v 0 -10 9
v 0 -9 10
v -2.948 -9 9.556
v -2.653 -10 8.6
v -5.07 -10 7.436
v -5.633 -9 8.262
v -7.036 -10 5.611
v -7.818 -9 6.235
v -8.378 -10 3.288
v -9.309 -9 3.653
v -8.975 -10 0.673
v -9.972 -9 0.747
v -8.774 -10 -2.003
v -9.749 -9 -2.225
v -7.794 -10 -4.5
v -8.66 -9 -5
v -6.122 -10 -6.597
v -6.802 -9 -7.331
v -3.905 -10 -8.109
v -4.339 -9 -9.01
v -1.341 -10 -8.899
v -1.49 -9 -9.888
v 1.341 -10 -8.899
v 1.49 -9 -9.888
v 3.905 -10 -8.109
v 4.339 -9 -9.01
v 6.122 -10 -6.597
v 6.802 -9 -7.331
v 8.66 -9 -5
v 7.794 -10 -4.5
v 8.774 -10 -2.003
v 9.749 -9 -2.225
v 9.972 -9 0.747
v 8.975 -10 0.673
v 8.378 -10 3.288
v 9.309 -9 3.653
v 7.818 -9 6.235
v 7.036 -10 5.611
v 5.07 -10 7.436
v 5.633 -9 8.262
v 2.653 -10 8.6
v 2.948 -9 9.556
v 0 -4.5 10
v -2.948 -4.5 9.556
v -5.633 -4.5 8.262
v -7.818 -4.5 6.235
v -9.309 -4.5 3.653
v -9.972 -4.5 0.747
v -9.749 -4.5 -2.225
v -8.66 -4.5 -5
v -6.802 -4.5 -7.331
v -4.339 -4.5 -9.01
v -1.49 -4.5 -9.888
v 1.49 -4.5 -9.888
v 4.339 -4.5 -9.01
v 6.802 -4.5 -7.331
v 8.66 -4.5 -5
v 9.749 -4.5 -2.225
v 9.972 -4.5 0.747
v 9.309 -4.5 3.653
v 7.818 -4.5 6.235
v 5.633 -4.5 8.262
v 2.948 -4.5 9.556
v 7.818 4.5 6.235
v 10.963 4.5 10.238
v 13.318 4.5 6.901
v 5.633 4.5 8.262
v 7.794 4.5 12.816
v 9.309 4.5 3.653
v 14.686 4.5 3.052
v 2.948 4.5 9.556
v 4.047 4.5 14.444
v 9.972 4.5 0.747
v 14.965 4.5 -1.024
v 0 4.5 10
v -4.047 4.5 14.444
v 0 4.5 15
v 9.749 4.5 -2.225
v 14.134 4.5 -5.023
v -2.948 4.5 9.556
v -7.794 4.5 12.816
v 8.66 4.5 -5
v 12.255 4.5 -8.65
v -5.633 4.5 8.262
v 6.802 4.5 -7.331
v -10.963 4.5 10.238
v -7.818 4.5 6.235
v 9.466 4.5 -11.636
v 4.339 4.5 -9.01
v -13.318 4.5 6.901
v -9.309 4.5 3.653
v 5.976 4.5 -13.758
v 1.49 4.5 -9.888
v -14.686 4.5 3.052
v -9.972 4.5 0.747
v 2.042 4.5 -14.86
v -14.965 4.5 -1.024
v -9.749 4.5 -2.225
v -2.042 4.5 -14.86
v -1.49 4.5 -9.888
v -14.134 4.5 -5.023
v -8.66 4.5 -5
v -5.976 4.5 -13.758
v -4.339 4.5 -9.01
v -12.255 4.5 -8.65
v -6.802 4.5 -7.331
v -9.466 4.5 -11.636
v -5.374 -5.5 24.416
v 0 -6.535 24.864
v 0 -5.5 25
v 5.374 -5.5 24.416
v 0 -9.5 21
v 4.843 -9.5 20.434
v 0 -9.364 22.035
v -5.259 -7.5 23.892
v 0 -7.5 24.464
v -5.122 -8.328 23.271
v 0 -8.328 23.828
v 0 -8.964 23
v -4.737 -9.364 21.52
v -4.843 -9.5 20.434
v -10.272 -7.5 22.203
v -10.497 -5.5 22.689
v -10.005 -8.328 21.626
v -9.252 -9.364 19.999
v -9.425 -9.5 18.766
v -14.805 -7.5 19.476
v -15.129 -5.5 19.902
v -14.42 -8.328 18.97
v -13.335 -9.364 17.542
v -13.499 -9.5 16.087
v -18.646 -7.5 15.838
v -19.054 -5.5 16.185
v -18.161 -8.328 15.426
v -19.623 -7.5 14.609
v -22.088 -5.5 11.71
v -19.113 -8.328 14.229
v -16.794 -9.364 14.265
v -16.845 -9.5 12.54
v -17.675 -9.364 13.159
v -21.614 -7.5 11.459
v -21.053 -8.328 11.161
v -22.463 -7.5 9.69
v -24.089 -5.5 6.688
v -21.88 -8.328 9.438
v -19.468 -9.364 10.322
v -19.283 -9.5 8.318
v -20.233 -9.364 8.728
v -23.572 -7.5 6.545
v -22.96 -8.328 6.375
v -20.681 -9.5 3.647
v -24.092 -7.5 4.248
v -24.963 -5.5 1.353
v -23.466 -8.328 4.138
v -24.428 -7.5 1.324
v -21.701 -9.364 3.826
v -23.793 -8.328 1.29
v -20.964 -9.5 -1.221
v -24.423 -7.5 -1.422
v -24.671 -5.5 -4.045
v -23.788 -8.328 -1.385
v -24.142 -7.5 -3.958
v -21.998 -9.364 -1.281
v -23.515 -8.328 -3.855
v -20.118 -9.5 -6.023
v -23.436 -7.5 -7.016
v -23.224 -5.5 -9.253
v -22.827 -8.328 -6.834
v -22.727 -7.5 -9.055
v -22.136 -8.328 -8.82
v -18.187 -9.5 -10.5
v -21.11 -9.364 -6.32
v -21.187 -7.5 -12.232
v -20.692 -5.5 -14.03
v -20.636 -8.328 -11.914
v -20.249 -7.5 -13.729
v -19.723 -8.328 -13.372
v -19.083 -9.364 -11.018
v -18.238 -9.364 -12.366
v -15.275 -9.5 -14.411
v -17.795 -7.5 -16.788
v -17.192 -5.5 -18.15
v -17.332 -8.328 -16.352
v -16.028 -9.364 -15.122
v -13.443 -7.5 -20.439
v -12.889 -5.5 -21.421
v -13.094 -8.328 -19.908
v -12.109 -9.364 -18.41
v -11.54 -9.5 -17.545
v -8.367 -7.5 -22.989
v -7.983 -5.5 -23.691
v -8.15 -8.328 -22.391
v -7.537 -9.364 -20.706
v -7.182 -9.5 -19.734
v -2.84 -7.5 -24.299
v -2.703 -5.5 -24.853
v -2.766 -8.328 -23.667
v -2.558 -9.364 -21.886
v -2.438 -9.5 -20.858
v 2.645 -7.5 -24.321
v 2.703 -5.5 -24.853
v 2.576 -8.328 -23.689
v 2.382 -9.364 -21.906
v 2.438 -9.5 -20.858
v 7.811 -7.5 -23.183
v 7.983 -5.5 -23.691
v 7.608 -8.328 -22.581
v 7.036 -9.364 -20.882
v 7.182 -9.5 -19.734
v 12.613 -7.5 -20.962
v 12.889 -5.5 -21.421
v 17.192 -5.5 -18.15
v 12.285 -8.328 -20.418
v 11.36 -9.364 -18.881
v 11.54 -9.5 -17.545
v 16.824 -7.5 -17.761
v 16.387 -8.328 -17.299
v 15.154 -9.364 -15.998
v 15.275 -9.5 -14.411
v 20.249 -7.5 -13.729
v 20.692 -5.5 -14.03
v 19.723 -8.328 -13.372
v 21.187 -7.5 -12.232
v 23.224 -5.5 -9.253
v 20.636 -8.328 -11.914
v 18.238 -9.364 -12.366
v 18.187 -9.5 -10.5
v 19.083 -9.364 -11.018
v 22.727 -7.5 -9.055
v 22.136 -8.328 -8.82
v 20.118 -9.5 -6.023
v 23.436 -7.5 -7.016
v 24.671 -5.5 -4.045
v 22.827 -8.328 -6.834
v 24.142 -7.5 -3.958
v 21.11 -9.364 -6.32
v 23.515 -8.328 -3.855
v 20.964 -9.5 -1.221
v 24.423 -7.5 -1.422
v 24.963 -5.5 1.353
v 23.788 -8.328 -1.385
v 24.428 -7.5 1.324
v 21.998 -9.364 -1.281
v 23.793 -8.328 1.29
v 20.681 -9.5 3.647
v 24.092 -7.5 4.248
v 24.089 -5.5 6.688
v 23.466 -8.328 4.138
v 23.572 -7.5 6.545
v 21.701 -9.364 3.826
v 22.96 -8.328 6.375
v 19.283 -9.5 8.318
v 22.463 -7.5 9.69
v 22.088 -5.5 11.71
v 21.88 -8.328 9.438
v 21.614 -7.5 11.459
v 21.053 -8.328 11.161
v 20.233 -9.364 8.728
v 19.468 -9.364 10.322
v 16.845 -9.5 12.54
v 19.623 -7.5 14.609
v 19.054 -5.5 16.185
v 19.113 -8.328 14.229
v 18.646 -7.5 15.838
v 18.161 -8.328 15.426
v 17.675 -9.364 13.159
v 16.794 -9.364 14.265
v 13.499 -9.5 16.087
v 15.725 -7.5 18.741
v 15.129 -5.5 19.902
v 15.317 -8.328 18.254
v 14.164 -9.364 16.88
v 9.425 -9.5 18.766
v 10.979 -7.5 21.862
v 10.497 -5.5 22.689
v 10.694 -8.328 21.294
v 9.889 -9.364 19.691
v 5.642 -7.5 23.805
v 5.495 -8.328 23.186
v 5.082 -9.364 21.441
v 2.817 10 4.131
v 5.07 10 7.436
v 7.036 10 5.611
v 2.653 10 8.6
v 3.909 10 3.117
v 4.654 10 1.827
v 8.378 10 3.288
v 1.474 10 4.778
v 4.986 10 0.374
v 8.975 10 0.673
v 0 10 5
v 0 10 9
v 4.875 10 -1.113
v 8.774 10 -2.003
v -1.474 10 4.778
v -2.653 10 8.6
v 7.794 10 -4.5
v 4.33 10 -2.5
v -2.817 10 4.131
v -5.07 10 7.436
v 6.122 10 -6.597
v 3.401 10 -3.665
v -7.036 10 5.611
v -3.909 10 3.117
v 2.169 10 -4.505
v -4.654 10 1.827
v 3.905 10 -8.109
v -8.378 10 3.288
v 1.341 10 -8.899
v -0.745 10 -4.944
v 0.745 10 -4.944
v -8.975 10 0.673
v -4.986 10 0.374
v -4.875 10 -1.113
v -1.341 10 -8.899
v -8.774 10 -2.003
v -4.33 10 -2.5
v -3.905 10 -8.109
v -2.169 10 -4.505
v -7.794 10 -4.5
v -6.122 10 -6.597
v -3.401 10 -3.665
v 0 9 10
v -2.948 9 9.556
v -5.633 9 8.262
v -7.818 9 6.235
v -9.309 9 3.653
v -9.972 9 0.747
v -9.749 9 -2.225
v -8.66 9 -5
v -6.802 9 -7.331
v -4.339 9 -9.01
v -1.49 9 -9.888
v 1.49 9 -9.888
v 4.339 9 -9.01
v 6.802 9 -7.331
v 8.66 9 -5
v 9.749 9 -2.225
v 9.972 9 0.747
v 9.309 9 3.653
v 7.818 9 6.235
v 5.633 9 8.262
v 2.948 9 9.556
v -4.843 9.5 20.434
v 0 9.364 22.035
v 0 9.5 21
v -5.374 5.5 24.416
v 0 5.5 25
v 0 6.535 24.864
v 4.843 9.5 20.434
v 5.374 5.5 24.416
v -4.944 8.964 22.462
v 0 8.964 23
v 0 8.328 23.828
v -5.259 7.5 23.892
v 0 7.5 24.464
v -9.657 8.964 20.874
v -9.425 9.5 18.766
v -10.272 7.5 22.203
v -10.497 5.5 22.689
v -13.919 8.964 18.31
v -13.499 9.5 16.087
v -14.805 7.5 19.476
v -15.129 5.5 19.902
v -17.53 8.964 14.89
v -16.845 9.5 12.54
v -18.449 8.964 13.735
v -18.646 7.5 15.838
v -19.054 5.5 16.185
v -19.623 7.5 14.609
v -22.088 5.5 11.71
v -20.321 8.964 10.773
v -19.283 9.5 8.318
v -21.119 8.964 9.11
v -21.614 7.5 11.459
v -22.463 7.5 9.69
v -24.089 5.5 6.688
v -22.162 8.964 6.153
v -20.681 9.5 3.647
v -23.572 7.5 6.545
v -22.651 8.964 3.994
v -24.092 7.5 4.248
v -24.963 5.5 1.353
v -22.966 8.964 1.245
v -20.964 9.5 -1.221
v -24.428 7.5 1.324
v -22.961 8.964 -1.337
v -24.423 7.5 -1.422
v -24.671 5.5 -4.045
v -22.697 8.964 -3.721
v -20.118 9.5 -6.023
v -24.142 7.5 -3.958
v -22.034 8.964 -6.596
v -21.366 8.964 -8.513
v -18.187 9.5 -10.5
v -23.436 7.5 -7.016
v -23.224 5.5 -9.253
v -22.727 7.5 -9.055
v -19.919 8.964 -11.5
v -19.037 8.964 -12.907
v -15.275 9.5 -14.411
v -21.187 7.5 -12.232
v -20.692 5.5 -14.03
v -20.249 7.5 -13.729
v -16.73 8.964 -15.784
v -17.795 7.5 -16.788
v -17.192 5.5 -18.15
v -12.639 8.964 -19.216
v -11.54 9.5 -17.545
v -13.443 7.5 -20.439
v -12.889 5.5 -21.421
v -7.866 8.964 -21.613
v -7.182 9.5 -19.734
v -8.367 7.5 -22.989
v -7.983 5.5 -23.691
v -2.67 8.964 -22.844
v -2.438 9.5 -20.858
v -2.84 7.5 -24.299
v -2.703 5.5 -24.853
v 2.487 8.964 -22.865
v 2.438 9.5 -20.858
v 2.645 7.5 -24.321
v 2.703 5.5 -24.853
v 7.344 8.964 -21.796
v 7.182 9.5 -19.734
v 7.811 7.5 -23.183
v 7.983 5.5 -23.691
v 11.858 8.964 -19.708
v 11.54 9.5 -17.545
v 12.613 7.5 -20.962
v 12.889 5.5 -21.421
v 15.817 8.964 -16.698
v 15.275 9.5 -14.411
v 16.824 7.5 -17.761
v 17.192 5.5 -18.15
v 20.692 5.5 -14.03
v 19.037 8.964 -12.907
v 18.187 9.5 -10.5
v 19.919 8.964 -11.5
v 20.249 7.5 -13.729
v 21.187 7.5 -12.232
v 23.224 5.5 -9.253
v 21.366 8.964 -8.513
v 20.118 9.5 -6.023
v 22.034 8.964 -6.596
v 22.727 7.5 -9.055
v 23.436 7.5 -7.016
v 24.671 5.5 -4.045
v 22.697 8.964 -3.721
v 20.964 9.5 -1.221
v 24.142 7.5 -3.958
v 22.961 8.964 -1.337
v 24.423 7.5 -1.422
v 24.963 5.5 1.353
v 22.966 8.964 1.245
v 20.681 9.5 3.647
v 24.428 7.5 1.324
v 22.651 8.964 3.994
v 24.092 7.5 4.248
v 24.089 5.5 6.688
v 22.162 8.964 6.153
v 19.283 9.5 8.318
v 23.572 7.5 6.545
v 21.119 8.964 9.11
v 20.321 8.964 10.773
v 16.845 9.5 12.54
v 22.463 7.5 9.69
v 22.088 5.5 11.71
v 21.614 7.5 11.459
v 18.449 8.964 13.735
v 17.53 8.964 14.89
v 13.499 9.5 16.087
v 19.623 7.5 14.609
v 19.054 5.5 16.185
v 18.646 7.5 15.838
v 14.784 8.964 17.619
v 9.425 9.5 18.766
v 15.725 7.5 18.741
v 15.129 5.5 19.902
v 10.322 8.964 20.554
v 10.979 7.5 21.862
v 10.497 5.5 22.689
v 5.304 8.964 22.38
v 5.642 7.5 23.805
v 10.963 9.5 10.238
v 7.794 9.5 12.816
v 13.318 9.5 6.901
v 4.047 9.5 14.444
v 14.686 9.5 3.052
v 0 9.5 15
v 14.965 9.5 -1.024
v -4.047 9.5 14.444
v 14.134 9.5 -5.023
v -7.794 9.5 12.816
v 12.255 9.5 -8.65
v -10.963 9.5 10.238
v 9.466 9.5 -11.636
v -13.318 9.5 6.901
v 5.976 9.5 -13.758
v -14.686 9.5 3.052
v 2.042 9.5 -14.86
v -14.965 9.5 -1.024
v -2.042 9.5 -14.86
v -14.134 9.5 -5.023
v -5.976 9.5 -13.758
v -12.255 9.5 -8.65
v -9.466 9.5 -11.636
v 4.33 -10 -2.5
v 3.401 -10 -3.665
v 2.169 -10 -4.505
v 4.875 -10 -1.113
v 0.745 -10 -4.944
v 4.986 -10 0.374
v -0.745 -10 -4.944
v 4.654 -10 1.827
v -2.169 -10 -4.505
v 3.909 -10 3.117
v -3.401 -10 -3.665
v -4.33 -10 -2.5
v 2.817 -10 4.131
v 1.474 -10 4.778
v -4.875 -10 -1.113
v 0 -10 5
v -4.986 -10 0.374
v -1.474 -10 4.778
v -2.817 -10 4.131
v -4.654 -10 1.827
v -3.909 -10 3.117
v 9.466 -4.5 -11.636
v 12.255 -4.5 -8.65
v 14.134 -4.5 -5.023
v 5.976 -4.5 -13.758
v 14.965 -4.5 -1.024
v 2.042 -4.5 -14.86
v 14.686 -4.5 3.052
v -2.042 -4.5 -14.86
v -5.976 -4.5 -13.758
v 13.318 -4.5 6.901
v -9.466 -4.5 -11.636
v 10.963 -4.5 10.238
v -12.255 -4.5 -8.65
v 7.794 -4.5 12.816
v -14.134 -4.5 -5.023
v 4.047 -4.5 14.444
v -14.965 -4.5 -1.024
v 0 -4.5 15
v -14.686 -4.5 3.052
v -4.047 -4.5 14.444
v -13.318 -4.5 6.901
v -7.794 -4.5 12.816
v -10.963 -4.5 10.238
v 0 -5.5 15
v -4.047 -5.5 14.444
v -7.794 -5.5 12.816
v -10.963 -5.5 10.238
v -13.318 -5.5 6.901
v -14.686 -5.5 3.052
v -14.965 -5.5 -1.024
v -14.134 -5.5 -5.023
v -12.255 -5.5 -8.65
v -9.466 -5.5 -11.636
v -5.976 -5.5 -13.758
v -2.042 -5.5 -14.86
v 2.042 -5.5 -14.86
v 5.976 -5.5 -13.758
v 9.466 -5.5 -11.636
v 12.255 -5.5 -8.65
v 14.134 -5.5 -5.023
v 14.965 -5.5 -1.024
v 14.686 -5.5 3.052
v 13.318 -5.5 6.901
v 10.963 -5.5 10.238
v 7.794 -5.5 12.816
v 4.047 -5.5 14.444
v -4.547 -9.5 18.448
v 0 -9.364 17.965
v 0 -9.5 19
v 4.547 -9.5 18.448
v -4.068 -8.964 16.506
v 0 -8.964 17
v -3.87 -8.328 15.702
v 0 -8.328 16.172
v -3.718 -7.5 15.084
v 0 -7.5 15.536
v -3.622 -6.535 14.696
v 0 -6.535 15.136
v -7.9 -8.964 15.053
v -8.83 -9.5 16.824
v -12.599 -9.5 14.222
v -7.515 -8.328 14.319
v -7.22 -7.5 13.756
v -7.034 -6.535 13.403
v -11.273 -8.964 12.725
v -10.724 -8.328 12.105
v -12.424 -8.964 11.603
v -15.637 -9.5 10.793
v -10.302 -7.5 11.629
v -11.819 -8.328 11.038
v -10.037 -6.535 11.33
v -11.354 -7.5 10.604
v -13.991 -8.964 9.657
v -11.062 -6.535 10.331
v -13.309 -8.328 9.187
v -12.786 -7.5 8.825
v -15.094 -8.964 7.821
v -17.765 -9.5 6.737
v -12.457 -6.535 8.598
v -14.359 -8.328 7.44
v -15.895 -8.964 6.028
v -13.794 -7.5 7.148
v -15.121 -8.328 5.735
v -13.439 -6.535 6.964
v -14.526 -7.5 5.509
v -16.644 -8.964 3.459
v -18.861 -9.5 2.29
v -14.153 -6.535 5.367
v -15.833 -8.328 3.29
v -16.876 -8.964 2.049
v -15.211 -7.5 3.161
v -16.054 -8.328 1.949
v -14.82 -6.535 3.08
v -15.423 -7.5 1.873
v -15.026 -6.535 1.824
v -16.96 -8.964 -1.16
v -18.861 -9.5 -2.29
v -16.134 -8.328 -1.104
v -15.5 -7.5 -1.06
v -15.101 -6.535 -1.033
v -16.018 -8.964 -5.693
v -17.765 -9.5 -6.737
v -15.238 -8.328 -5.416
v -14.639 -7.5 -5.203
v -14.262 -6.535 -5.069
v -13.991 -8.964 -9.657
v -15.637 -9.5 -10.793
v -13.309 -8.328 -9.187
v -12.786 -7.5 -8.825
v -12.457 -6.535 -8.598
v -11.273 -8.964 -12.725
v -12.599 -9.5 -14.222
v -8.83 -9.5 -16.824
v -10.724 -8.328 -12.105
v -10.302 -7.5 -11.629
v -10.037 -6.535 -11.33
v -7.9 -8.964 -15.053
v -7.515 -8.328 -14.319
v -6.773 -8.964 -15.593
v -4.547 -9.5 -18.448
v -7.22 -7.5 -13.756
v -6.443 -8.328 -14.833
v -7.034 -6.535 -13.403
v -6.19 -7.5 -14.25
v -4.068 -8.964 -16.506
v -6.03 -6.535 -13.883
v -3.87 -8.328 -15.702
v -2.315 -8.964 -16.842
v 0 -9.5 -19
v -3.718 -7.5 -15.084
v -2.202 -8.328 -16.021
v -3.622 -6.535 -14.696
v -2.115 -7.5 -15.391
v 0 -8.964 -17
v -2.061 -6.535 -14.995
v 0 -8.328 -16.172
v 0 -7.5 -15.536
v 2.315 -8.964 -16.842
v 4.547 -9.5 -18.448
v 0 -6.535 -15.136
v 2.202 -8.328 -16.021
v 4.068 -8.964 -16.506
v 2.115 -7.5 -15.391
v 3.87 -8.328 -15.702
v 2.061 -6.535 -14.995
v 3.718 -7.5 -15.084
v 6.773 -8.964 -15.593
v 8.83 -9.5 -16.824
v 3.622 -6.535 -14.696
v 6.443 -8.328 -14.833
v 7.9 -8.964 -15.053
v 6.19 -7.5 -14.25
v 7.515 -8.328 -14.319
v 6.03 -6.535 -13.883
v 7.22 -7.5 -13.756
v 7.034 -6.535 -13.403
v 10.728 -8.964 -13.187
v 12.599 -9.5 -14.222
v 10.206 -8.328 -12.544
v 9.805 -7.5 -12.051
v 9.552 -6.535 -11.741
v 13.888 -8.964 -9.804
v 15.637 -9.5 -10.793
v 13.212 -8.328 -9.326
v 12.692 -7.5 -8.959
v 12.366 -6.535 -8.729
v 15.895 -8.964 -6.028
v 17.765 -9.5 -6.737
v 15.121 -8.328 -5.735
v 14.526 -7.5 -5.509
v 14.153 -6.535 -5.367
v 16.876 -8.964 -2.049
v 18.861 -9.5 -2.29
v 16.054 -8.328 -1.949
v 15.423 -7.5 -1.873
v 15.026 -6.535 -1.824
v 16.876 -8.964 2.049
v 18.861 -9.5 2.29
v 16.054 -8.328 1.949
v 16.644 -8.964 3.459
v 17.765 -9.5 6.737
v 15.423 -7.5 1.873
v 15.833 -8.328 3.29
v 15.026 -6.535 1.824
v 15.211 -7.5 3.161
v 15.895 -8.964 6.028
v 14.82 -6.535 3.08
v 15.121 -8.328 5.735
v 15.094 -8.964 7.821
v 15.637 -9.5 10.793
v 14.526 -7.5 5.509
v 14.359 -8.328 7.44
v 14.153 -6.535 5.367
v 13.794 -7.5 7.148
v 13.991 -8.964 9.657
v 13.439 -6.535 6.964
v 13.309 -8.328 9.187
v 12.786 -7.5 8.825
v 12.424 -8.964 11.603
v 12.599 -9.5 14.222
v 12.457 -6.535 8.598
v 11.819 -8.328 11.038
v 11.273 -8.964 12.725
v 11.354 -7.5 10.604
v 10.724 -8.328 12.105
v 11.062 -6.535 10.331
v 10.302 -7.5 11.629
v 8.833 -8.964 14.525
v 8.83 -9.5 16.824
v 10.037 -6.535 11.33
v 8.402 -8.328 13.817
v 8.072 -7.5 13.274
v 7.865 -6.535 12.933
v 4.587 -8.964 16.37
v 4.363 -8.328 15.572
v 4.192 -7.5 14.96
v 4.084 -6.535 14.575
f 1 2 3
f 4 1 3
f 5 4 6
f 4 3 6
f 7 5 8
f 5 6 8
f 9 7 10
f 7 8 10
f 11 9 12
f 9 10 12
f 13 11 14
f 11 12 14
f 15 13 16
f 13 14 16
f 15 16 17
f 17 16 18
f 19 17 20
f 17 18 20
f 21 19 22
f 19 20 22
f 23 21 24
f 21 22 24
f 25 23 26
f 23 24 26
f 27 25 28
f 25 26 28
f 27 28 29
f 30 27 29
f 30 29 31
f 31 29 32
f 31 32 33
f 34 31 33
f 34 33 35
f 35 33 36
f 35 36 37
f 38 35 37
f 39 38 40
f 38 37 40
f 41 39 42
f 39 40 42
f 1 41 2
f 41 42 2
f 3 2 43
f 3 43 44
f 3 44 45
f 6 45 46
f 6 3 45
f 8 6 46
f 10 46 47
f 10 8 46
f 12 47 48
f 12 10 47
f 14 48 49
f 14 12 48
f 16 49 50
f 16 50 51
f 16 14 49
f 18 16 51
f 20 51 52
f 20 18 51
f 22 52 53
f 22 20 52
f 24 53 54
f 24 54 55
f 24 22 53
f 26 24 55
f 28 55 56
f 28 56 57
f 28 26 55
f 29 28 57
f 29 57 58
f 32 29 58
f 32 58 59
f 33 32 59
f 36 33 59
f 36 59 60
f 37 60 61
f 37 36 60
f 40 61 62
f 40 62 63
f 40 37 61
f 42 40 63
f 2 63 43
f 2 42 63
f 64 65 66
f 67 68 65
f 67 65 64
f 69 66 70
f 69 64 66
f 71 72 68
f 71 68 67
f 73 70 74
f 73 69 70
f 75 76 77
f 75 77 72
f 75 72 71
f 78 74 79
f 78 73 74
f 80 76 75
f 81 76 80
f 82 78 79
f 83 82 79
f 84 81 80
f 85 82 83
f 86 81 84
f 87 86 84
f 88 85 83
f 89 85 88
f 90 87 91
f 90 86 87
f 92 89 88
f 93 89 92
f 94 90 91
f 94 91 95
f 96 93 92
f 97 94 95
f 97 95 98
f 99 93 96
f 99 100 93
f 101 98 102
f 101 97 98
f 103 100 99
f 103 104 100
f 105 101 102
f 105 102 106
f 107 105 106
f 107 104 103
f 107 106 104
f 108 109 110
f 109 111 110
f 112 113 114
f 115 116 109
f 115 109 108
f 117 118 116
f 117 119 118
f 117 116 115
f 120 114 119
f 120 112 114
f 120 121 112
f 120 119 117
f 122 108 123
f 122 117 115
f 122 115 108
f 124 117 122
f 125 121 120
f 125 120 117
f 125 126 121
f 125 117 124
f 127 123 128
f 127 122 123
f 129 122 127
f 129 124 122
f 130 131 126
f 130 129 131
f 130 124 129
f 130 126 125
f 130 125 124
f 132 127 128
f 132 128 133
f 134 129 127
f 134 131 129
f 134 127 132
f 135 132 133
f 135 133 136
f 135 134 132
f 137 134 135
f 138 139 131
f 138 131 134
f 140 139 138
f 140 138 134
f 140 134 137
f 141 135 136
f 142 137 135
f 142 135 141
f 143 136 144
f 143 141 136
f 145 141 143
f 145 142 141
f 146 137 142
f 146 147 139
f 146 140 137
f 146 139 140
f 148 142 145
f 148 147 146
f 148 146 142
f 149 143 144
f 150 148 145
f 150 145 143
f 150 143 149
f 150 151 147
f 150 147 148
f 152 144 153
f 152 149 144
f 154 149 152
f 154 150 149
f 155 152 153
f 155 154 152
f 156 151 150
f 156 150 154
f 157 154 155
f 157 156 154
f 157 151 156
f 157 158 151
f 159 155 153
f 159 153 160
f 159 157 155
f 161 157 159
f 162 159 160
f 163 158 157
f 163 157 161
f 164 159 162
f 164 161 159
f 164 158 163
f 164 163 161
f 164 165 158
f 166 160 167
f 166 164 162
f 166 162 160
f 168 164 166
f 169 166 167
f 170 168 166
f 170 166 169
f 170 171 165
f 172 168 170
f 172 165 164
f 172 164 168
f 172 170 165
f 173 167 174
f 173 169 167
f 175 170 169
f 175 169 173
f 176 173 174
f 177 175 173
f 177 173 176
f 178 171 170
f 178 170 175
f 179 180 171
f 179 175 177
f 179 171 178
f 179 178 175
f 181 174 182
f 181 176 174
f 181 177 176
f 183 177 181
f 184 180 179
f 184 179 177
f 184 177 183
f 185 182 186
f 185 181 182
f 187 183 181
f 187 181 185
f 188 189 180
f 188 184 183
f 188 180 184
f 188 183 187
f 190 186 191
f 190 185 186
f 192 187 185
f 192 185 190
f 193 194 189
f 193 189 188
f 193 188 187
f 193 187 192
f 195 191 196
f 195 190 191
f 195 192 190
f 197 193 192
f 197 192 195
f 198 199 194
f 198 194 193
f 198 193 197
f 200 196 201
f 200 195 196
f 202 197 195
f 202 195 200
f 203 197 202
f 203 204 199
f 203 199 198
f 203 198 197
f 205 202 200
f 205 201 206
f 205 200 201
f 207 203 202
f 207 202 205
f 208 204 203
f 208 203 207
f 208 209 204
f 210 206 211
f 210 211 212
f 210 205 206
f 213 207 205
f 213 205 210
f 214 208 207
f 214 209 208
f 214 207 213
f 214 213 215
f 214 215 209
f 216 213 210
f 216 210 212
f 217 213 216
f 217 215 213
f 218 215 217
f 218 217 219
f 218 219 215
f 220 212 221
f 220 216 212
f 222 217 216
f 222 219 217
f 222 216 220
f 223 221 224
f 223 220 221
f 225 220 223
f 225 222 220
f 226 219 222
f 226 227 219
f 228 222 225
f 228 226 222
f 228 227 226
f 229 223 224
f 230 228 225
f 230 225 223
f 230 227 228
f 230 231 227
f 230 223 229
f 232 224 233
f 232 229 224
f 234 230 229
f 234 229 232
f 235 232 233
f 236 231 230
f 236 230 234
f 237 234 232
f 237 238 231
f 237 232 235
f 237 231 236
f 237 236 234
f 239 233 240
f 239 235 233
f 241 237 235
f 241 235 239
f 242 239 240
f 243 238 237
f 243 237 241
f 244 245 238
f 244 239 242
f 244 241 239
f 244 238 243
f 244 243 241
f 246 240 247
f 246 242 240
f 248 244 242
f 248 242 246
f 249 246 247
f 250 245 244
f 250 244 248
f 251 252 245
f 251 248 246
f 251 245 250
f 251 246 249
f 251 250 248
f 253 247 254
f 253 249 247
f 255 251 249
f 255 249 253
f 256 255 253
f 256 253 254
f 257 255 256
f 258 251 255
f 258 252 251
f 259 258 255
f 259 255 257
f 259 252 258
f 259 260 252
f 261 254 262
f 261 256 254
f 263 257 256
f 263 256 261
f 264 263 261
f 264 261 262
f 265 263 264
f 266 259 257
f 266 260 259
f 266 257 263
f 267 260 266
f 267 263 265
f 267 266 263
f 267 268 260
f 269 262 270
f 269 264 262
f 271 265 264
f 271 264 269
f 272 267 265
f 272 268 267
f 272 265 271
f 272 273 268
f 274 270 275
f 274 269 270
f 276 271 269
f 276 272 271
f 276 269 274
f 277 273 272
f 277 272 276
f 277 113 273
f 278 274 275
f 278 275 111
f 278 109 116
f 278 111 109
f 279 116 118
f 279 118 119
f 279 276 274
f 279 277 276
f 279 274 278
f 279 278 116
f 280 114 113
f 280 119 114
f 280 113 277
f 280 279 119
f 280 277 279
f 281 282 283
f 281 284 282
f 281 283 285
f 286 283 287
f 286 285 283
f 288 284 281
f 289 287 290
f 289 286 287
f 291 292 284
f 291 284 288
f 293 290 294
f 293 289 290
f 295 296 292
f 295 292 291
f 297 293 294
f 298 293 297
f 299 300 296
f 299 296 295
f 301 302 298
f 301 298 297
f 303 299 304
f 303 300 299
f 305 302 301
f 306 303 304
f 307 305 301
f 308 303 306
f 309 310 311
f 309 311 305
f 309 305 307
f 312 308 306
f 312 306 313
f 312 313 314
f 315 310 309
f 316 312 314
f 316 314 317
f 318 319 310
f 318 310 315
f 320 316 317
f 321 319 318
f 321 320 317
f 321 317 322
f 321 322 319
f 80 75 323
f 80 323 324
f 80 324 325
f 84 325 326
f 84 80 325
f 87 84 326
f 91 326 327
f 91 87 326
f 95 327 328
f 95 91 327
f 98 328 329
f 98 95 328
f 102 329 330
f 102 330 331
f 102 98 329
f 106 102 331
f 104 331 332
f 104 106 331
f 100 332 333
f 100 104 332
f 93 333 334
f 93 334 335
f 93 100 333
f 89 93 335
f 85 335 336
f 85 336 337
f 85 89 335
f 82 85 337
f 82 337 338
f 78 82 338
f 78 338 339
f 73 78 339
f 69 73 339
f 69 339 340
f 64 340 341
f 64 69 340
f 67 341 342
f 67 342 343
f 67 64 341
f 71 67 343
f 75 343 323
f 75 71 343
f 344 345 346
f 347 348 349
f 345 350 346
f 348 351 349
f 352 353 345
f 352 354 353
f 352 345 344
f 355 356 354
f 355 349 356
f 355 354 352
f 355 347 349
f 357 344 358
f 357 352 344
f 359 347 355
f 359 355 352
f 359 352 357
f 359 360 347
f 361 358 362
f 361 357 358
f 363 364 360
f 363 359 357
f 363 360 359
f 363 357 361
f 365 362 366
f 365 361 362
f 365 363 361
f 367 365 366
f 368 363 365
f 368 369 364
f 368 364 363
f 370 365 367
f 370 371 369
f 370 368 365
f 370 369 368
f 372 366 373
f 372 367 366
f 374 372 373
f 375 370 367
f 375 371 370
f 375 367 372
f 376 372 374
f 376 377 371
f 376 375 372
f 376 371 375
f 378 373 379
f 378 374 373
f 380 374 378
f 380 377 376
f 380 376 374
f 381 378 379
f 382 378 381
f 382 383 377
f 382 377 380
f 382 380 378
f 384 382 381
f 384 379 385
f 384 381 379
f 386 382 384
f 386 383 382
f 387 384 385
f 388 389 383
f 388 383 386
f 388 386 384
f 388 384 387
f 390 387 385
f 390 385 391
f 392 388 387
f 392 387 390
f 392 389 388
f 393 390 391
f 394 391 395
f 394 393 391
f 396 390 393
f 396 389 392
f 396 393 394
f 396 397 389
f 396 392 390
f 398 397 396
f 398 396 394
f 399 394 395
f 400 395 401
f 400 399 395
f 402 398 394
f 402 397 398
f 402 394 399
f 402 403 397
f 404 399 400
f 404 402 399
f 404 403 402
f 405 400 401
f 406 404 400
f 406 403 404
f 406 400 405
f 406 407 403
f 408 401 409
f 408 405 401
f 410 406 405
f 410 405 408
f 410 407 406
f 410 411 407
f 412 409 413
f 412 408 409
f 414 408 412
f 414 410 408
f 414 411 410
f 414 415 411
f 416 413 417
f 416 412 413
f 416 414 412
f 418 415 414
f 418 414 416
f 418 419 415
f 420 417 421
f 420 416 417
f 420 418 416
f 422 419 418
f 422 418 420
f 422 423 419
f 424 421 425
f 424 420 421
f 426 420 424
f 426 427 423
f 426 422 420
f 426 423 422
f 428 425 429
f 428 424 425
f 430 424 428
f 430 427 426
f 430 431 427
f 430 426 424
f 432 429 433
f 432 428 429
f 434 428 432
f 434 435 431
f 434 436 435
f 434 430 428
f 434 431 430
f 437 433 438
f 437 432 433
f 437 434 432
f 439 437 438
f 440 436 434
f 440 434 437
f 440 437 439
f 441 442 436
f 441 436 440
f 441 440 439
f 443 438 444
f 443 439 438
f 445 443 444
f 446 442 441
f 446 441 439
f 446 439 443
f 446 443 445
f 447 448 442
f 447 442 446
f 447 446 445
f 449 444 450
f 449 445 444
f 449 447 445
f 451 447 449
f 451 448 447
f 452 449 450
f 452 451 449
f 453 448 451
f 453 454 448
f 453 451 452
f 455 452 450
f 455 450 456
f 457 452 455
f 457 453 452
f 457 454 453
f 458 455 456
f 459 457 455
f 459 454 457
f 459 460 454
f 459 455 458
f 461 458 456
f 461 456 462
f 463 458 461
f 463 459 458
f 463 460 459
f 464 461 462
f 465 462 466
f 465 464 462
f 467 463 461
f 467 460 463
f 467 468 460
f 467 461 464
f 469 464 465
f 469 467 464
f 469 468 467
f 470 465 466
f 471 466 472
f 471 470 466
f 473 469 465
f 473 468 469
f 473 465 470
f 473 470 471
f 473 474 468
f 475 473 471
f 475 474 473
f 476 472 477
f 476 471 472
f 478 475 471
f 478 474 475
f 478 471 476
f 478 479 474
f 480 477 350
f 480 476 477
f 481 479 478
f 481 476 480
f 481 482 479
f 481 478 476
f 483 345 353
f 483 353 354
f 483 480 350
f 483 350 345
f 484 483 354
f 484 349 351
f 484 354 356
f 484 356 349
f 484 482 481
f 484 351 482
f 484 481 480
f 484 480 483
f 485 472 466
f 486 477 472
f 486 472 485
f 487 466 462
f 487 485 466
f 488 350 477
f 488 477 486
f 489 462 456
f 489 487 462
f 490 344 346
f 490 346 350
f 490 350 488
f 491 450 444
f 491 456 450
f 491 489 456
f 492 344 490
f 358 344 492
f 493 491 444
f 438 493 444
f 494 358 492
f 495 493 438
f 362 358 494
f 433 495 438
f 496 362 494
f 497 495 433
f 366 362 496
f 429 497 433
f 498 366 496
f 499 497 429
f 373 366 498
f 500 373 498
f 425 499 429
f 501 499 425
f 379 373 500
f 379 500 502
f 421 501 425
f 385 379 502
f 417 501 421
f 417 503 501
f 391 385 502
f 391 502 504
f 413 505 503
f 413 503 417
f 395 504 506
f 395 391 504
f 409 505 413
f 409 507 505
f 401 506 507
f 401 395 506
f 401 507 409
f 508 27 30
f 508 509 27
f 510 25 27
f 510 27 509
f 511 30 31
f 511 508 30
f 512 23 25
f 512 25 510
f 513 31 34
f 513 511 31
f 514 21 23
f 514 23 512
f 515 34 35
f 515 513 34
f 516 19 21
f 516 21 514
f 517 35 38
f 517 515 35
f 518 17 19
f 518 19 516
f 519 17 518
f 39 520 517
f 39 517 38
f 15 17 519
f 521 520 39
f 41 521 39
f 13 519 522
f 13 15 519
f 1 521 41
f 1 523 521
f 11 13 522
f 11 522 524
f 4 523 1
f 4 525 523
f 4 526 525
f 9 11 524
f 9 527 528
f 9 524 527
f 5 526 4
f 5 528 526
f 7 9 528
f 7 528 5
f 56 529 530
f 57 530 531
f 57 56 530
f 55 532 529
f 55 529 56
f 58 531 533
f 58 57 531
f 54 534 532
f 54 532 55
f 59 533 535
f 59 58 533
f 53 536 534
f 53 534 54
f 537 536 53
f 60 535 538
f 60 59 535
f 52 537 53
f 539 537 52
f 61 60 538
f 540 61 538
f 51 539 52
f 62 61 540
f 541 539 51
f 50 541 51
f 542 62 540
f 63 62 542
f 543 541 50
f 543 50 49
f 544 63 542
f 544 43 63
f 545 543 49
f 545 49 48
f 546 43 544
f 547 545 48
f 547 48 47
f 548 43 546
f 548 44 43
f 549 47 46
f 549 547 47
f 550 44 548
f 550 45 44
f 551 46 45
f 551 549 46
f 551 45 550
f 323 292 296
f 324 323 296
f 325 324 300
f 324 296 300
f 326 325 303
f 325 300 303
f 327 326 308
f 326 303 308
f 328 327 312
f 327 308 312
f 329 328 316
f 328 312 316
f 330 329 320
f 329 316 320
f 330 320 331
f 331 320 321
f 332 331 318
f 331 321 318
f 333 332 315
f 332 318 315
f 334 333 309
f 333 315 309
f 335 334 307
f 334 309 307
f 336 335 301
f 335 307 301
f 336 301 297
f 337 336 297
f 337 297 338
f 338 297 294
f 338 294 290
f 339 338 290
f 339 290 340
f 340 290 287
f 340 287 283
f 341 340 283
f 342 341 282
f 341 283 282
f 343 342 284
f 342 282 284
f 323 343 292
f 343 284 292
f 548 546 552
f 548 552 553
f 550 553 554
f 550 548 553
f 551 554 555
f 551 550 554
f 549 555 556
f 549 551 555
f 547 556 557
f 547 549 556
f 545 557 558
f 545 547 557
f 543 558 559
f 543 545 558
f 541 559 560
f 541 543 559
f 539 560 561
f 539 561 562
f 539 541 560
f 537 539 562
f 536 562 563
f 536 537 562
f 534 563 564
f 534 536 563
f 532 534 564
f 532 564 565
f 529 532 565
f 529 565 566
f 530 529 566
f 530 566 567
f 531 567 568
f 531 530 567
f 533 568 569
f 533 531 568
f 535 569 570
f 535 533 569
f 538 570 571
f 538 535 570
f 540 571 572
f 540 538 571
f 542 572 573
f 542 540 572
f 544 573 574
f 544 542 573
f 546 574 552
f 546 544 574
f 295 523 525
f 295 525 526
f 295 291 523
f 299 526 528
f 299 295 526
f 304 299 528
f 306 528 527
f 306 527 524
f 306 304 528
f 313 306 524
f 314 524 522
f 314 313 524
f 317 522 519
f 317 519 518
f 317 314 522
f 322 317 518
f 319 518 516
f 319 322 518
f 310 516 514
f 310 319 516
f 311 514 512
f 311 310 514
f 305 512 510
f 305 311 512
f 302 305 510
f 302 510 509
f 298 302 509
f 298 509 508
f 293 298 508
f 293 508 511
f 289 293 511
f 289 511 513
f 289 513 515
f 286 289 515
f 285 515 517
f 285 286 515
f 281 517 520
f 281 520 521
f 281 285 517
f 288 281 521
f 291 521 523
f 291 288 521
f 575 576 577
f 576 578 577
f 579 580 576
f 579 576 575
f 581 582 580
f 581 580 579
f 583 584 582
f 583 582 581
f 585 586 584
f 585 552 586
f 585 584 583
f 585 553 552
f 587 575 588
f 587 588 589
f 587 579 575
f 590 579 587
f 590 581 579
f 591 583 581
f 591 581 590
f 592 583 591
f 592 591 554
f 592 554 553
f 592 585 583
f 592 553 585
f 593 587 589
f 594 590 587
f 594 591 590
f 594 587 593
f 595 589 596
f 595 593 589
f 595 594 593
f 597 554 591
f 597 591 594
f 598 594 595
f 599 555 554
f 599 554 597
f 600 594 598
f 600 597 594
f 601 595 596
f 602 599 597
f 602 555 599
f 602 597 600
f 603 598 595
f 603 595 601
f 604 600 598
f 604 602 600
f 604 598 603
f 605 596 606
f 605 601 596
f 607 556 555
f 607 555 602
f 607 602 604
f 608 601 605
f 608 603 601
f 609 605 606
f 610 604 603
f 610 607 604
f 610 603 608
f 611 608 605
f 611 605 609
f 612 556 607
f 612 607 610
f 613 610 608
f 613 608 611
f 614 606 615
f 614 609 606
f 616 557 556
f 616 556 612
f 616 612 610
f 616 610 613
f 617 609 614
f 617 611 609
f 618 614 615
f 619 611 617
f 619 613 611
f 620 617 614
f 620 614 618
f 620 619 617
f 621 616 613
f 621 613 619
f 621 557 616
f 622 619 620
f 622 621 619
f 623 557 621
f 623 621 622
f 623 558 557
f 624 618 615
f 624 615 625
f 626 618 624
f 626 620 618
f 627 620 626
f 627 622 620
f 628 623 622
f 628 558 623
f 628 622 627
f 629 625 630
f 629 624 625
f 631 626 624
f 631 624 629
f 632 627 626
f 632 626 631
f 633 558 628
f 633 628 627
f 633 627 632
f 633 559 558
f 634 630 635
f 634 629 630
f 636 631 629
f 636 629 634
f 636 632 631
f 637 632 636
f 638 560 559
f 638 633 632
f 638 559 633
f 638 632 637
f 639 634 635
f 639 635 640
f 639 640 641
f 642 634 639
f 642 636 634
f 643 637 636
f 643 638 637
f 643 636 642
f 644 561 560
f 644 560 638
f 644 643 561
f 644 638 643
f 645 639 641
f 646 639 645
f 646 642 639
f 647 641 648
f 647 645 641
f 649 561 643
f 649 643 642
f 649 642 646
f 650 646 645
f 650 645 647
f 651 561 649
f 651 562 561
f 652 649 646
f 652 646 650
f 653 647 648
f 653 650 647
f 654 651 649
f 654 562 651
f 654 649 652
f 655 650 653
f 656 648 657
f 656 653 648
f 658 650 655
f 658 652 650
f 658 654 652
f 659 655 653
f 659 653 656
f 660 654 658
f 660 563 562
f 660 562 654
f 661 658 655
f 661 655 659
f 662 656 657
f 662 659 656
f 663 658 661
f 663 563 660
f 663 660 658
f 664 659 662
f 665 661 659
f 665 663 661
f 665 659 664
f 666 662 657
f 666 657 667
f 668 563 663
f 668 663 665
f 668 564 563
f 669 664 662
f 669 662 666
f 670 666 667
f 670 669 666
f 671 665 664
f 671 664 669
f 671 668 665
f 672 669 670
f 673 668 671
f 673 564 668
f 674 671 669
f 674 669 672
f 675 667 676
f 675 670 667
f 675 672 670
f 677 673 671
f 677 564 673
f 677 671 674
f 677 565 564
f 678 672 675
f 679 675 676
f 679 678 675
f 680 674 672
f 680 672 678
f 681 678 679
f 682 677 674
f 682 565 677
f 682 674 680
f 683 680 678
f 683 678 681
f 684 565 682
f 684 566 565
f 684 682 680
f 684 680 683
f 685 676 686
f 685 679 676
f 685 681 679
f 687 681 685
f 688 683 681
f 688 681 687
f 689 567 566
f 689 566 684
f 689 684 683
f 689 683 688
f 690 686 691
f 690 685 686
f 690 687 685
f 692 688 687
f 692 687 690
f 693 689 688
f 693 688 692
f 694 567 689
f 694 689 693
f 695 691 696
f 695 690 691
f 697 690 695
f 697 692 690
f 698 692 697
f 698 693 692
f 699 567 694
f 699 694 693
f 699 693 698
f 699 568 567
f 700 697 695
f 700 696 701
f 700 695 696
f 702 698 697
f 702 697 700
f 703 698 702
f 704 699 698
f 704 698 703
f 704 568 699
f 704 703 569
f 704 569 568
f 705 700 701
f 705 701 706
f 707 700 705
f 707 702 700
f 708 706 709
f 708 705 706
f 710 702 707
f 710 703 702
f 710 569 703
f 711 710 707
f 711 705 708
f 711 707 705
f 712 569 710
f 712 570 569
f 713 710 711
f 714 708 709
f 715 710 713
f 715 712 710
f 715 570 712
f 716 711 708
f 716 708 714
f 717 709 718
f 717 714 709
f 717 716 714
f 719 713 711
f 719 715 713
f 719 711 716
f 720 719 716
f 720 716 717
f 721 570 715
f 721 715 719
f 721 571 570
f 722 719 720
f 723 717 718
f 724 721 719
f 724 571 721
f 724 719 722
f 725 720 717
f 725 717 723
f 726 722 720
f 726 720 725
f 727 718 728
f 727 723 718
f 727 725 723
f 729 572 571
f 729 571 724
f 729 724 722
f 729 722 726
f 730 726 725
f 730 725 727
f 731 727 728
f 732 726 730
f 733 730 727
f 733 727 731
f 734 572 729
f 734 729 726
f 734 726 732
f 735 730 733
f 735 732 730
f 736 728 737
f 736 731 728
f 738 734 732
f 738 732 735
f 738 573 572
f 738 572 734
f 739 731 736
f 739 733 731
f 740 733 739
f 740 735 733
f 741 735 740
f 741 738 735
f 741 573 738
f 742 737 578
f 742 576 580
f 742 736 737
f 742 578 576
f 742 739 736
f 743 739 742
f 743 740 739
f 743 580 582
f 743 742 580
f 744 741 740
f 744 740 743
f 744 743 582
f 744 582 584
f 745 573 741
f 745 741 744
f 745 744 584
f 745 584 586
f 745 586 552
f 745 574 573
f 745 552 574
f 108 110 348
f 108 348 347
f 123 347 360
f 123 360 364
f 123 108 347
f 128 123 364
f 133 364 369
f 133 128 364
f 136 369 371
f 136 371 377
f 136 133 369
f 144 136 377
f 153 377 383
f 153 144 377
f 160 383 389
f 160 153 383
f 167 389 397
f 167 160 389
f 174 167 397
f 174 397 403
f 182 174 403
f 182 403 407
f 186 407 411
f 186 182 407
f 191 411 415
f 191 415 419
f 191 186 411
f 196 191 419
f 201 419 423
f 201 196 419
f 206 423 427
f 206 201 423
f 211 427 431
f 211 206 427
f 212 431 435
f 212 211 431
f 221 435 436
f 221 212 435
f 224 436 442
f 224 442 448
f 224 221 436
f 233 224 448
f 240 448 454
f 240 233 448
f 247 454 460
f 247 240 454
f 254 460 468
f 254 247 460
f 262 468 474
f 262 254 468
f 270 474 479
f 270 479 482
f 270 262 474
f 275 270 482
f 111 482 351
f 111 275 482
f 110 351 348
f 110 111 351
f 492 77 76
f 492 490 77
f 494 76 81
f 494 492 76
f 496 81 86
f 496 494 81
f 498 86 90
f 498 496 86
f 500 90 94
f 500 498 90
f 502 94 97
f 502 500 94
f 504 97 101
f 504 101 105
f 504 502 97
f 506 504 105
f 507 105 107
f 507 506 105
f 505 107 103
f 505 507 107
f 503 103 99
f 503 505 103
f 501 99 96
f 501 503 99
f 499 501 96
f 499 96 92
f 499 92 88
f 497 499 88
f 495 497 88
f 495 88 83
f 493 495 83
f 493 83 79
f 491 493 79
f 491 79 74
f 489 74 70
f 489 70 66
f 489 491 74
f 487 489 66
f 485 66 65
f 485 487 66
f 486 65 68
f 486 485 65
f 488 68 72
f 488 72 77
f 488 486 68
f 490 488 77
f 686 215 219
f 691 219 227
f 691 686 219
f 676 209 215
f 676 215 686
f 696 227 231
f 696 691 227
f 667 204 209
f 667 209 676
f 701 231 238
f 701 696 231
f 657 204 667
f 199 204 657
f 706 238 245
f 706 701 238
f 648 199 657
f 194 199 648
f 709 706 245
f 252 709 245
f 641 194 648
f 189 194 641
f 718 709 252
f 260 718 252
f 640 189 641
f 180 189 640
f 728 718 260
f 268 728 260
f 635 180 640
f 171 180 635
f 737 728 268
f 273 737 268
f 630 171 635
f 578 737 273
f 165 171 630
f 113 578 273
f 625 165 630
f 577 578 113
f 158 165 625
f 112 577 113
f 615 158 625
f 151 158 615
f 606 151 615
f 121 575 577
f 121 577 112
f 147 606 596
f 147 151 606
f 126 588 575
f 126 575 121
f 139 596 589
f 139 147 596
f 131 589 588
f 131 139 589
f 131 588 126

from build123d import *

# Parameters (mm, degrees)
FILLET1_R     = 4
CHAMFER1_SIZE = 1


with BuildPart() as part:
    # Sketch2 → Revolve1 (revolve)
    with BuildSketch(Plane(origin=(0, 0, 0), x_dir=(0, 0, -1), z_dir=(1, 0, 0)), mode=Mode.PRIVATE) as revolve1_sk:
        Polygon((10, 10), (10, 4.5), (15, 4.5), (15, 9.5), (25, 9.5), (25, -9.5), (15, -9.5), (15, -4.5), (10, -4.5), (10, -10), (5, -10), (5, 10), align=None)
    revolve(revolve1_sk.sketch.rotate(Axis((0, 38.551811756, 0), (0, -1, 0)), 180), axis=Axis((0, 38.551811756, 0), (0, -1, 0)))

    # Fillet1
    fillet1_edges = [part.edges().sort_by_distance(p)[0] for p in [
        (0, -9.5, -15),
        (0, -9.5, -25),
        (0, 9.5, -25),
    ]]
    fillet(fillet1_edges, radius=FILLET1_R)

    # Chamfer1
    chamfer1_edges = [part.edges().sort_by_distance(p)[0] for p in [
        (0, -10, -10),
        (0, 10, -10),
    ]]
    chamfer(chamfer1_edges, length=CHAMFER1_SIZE)


solid = part.part
